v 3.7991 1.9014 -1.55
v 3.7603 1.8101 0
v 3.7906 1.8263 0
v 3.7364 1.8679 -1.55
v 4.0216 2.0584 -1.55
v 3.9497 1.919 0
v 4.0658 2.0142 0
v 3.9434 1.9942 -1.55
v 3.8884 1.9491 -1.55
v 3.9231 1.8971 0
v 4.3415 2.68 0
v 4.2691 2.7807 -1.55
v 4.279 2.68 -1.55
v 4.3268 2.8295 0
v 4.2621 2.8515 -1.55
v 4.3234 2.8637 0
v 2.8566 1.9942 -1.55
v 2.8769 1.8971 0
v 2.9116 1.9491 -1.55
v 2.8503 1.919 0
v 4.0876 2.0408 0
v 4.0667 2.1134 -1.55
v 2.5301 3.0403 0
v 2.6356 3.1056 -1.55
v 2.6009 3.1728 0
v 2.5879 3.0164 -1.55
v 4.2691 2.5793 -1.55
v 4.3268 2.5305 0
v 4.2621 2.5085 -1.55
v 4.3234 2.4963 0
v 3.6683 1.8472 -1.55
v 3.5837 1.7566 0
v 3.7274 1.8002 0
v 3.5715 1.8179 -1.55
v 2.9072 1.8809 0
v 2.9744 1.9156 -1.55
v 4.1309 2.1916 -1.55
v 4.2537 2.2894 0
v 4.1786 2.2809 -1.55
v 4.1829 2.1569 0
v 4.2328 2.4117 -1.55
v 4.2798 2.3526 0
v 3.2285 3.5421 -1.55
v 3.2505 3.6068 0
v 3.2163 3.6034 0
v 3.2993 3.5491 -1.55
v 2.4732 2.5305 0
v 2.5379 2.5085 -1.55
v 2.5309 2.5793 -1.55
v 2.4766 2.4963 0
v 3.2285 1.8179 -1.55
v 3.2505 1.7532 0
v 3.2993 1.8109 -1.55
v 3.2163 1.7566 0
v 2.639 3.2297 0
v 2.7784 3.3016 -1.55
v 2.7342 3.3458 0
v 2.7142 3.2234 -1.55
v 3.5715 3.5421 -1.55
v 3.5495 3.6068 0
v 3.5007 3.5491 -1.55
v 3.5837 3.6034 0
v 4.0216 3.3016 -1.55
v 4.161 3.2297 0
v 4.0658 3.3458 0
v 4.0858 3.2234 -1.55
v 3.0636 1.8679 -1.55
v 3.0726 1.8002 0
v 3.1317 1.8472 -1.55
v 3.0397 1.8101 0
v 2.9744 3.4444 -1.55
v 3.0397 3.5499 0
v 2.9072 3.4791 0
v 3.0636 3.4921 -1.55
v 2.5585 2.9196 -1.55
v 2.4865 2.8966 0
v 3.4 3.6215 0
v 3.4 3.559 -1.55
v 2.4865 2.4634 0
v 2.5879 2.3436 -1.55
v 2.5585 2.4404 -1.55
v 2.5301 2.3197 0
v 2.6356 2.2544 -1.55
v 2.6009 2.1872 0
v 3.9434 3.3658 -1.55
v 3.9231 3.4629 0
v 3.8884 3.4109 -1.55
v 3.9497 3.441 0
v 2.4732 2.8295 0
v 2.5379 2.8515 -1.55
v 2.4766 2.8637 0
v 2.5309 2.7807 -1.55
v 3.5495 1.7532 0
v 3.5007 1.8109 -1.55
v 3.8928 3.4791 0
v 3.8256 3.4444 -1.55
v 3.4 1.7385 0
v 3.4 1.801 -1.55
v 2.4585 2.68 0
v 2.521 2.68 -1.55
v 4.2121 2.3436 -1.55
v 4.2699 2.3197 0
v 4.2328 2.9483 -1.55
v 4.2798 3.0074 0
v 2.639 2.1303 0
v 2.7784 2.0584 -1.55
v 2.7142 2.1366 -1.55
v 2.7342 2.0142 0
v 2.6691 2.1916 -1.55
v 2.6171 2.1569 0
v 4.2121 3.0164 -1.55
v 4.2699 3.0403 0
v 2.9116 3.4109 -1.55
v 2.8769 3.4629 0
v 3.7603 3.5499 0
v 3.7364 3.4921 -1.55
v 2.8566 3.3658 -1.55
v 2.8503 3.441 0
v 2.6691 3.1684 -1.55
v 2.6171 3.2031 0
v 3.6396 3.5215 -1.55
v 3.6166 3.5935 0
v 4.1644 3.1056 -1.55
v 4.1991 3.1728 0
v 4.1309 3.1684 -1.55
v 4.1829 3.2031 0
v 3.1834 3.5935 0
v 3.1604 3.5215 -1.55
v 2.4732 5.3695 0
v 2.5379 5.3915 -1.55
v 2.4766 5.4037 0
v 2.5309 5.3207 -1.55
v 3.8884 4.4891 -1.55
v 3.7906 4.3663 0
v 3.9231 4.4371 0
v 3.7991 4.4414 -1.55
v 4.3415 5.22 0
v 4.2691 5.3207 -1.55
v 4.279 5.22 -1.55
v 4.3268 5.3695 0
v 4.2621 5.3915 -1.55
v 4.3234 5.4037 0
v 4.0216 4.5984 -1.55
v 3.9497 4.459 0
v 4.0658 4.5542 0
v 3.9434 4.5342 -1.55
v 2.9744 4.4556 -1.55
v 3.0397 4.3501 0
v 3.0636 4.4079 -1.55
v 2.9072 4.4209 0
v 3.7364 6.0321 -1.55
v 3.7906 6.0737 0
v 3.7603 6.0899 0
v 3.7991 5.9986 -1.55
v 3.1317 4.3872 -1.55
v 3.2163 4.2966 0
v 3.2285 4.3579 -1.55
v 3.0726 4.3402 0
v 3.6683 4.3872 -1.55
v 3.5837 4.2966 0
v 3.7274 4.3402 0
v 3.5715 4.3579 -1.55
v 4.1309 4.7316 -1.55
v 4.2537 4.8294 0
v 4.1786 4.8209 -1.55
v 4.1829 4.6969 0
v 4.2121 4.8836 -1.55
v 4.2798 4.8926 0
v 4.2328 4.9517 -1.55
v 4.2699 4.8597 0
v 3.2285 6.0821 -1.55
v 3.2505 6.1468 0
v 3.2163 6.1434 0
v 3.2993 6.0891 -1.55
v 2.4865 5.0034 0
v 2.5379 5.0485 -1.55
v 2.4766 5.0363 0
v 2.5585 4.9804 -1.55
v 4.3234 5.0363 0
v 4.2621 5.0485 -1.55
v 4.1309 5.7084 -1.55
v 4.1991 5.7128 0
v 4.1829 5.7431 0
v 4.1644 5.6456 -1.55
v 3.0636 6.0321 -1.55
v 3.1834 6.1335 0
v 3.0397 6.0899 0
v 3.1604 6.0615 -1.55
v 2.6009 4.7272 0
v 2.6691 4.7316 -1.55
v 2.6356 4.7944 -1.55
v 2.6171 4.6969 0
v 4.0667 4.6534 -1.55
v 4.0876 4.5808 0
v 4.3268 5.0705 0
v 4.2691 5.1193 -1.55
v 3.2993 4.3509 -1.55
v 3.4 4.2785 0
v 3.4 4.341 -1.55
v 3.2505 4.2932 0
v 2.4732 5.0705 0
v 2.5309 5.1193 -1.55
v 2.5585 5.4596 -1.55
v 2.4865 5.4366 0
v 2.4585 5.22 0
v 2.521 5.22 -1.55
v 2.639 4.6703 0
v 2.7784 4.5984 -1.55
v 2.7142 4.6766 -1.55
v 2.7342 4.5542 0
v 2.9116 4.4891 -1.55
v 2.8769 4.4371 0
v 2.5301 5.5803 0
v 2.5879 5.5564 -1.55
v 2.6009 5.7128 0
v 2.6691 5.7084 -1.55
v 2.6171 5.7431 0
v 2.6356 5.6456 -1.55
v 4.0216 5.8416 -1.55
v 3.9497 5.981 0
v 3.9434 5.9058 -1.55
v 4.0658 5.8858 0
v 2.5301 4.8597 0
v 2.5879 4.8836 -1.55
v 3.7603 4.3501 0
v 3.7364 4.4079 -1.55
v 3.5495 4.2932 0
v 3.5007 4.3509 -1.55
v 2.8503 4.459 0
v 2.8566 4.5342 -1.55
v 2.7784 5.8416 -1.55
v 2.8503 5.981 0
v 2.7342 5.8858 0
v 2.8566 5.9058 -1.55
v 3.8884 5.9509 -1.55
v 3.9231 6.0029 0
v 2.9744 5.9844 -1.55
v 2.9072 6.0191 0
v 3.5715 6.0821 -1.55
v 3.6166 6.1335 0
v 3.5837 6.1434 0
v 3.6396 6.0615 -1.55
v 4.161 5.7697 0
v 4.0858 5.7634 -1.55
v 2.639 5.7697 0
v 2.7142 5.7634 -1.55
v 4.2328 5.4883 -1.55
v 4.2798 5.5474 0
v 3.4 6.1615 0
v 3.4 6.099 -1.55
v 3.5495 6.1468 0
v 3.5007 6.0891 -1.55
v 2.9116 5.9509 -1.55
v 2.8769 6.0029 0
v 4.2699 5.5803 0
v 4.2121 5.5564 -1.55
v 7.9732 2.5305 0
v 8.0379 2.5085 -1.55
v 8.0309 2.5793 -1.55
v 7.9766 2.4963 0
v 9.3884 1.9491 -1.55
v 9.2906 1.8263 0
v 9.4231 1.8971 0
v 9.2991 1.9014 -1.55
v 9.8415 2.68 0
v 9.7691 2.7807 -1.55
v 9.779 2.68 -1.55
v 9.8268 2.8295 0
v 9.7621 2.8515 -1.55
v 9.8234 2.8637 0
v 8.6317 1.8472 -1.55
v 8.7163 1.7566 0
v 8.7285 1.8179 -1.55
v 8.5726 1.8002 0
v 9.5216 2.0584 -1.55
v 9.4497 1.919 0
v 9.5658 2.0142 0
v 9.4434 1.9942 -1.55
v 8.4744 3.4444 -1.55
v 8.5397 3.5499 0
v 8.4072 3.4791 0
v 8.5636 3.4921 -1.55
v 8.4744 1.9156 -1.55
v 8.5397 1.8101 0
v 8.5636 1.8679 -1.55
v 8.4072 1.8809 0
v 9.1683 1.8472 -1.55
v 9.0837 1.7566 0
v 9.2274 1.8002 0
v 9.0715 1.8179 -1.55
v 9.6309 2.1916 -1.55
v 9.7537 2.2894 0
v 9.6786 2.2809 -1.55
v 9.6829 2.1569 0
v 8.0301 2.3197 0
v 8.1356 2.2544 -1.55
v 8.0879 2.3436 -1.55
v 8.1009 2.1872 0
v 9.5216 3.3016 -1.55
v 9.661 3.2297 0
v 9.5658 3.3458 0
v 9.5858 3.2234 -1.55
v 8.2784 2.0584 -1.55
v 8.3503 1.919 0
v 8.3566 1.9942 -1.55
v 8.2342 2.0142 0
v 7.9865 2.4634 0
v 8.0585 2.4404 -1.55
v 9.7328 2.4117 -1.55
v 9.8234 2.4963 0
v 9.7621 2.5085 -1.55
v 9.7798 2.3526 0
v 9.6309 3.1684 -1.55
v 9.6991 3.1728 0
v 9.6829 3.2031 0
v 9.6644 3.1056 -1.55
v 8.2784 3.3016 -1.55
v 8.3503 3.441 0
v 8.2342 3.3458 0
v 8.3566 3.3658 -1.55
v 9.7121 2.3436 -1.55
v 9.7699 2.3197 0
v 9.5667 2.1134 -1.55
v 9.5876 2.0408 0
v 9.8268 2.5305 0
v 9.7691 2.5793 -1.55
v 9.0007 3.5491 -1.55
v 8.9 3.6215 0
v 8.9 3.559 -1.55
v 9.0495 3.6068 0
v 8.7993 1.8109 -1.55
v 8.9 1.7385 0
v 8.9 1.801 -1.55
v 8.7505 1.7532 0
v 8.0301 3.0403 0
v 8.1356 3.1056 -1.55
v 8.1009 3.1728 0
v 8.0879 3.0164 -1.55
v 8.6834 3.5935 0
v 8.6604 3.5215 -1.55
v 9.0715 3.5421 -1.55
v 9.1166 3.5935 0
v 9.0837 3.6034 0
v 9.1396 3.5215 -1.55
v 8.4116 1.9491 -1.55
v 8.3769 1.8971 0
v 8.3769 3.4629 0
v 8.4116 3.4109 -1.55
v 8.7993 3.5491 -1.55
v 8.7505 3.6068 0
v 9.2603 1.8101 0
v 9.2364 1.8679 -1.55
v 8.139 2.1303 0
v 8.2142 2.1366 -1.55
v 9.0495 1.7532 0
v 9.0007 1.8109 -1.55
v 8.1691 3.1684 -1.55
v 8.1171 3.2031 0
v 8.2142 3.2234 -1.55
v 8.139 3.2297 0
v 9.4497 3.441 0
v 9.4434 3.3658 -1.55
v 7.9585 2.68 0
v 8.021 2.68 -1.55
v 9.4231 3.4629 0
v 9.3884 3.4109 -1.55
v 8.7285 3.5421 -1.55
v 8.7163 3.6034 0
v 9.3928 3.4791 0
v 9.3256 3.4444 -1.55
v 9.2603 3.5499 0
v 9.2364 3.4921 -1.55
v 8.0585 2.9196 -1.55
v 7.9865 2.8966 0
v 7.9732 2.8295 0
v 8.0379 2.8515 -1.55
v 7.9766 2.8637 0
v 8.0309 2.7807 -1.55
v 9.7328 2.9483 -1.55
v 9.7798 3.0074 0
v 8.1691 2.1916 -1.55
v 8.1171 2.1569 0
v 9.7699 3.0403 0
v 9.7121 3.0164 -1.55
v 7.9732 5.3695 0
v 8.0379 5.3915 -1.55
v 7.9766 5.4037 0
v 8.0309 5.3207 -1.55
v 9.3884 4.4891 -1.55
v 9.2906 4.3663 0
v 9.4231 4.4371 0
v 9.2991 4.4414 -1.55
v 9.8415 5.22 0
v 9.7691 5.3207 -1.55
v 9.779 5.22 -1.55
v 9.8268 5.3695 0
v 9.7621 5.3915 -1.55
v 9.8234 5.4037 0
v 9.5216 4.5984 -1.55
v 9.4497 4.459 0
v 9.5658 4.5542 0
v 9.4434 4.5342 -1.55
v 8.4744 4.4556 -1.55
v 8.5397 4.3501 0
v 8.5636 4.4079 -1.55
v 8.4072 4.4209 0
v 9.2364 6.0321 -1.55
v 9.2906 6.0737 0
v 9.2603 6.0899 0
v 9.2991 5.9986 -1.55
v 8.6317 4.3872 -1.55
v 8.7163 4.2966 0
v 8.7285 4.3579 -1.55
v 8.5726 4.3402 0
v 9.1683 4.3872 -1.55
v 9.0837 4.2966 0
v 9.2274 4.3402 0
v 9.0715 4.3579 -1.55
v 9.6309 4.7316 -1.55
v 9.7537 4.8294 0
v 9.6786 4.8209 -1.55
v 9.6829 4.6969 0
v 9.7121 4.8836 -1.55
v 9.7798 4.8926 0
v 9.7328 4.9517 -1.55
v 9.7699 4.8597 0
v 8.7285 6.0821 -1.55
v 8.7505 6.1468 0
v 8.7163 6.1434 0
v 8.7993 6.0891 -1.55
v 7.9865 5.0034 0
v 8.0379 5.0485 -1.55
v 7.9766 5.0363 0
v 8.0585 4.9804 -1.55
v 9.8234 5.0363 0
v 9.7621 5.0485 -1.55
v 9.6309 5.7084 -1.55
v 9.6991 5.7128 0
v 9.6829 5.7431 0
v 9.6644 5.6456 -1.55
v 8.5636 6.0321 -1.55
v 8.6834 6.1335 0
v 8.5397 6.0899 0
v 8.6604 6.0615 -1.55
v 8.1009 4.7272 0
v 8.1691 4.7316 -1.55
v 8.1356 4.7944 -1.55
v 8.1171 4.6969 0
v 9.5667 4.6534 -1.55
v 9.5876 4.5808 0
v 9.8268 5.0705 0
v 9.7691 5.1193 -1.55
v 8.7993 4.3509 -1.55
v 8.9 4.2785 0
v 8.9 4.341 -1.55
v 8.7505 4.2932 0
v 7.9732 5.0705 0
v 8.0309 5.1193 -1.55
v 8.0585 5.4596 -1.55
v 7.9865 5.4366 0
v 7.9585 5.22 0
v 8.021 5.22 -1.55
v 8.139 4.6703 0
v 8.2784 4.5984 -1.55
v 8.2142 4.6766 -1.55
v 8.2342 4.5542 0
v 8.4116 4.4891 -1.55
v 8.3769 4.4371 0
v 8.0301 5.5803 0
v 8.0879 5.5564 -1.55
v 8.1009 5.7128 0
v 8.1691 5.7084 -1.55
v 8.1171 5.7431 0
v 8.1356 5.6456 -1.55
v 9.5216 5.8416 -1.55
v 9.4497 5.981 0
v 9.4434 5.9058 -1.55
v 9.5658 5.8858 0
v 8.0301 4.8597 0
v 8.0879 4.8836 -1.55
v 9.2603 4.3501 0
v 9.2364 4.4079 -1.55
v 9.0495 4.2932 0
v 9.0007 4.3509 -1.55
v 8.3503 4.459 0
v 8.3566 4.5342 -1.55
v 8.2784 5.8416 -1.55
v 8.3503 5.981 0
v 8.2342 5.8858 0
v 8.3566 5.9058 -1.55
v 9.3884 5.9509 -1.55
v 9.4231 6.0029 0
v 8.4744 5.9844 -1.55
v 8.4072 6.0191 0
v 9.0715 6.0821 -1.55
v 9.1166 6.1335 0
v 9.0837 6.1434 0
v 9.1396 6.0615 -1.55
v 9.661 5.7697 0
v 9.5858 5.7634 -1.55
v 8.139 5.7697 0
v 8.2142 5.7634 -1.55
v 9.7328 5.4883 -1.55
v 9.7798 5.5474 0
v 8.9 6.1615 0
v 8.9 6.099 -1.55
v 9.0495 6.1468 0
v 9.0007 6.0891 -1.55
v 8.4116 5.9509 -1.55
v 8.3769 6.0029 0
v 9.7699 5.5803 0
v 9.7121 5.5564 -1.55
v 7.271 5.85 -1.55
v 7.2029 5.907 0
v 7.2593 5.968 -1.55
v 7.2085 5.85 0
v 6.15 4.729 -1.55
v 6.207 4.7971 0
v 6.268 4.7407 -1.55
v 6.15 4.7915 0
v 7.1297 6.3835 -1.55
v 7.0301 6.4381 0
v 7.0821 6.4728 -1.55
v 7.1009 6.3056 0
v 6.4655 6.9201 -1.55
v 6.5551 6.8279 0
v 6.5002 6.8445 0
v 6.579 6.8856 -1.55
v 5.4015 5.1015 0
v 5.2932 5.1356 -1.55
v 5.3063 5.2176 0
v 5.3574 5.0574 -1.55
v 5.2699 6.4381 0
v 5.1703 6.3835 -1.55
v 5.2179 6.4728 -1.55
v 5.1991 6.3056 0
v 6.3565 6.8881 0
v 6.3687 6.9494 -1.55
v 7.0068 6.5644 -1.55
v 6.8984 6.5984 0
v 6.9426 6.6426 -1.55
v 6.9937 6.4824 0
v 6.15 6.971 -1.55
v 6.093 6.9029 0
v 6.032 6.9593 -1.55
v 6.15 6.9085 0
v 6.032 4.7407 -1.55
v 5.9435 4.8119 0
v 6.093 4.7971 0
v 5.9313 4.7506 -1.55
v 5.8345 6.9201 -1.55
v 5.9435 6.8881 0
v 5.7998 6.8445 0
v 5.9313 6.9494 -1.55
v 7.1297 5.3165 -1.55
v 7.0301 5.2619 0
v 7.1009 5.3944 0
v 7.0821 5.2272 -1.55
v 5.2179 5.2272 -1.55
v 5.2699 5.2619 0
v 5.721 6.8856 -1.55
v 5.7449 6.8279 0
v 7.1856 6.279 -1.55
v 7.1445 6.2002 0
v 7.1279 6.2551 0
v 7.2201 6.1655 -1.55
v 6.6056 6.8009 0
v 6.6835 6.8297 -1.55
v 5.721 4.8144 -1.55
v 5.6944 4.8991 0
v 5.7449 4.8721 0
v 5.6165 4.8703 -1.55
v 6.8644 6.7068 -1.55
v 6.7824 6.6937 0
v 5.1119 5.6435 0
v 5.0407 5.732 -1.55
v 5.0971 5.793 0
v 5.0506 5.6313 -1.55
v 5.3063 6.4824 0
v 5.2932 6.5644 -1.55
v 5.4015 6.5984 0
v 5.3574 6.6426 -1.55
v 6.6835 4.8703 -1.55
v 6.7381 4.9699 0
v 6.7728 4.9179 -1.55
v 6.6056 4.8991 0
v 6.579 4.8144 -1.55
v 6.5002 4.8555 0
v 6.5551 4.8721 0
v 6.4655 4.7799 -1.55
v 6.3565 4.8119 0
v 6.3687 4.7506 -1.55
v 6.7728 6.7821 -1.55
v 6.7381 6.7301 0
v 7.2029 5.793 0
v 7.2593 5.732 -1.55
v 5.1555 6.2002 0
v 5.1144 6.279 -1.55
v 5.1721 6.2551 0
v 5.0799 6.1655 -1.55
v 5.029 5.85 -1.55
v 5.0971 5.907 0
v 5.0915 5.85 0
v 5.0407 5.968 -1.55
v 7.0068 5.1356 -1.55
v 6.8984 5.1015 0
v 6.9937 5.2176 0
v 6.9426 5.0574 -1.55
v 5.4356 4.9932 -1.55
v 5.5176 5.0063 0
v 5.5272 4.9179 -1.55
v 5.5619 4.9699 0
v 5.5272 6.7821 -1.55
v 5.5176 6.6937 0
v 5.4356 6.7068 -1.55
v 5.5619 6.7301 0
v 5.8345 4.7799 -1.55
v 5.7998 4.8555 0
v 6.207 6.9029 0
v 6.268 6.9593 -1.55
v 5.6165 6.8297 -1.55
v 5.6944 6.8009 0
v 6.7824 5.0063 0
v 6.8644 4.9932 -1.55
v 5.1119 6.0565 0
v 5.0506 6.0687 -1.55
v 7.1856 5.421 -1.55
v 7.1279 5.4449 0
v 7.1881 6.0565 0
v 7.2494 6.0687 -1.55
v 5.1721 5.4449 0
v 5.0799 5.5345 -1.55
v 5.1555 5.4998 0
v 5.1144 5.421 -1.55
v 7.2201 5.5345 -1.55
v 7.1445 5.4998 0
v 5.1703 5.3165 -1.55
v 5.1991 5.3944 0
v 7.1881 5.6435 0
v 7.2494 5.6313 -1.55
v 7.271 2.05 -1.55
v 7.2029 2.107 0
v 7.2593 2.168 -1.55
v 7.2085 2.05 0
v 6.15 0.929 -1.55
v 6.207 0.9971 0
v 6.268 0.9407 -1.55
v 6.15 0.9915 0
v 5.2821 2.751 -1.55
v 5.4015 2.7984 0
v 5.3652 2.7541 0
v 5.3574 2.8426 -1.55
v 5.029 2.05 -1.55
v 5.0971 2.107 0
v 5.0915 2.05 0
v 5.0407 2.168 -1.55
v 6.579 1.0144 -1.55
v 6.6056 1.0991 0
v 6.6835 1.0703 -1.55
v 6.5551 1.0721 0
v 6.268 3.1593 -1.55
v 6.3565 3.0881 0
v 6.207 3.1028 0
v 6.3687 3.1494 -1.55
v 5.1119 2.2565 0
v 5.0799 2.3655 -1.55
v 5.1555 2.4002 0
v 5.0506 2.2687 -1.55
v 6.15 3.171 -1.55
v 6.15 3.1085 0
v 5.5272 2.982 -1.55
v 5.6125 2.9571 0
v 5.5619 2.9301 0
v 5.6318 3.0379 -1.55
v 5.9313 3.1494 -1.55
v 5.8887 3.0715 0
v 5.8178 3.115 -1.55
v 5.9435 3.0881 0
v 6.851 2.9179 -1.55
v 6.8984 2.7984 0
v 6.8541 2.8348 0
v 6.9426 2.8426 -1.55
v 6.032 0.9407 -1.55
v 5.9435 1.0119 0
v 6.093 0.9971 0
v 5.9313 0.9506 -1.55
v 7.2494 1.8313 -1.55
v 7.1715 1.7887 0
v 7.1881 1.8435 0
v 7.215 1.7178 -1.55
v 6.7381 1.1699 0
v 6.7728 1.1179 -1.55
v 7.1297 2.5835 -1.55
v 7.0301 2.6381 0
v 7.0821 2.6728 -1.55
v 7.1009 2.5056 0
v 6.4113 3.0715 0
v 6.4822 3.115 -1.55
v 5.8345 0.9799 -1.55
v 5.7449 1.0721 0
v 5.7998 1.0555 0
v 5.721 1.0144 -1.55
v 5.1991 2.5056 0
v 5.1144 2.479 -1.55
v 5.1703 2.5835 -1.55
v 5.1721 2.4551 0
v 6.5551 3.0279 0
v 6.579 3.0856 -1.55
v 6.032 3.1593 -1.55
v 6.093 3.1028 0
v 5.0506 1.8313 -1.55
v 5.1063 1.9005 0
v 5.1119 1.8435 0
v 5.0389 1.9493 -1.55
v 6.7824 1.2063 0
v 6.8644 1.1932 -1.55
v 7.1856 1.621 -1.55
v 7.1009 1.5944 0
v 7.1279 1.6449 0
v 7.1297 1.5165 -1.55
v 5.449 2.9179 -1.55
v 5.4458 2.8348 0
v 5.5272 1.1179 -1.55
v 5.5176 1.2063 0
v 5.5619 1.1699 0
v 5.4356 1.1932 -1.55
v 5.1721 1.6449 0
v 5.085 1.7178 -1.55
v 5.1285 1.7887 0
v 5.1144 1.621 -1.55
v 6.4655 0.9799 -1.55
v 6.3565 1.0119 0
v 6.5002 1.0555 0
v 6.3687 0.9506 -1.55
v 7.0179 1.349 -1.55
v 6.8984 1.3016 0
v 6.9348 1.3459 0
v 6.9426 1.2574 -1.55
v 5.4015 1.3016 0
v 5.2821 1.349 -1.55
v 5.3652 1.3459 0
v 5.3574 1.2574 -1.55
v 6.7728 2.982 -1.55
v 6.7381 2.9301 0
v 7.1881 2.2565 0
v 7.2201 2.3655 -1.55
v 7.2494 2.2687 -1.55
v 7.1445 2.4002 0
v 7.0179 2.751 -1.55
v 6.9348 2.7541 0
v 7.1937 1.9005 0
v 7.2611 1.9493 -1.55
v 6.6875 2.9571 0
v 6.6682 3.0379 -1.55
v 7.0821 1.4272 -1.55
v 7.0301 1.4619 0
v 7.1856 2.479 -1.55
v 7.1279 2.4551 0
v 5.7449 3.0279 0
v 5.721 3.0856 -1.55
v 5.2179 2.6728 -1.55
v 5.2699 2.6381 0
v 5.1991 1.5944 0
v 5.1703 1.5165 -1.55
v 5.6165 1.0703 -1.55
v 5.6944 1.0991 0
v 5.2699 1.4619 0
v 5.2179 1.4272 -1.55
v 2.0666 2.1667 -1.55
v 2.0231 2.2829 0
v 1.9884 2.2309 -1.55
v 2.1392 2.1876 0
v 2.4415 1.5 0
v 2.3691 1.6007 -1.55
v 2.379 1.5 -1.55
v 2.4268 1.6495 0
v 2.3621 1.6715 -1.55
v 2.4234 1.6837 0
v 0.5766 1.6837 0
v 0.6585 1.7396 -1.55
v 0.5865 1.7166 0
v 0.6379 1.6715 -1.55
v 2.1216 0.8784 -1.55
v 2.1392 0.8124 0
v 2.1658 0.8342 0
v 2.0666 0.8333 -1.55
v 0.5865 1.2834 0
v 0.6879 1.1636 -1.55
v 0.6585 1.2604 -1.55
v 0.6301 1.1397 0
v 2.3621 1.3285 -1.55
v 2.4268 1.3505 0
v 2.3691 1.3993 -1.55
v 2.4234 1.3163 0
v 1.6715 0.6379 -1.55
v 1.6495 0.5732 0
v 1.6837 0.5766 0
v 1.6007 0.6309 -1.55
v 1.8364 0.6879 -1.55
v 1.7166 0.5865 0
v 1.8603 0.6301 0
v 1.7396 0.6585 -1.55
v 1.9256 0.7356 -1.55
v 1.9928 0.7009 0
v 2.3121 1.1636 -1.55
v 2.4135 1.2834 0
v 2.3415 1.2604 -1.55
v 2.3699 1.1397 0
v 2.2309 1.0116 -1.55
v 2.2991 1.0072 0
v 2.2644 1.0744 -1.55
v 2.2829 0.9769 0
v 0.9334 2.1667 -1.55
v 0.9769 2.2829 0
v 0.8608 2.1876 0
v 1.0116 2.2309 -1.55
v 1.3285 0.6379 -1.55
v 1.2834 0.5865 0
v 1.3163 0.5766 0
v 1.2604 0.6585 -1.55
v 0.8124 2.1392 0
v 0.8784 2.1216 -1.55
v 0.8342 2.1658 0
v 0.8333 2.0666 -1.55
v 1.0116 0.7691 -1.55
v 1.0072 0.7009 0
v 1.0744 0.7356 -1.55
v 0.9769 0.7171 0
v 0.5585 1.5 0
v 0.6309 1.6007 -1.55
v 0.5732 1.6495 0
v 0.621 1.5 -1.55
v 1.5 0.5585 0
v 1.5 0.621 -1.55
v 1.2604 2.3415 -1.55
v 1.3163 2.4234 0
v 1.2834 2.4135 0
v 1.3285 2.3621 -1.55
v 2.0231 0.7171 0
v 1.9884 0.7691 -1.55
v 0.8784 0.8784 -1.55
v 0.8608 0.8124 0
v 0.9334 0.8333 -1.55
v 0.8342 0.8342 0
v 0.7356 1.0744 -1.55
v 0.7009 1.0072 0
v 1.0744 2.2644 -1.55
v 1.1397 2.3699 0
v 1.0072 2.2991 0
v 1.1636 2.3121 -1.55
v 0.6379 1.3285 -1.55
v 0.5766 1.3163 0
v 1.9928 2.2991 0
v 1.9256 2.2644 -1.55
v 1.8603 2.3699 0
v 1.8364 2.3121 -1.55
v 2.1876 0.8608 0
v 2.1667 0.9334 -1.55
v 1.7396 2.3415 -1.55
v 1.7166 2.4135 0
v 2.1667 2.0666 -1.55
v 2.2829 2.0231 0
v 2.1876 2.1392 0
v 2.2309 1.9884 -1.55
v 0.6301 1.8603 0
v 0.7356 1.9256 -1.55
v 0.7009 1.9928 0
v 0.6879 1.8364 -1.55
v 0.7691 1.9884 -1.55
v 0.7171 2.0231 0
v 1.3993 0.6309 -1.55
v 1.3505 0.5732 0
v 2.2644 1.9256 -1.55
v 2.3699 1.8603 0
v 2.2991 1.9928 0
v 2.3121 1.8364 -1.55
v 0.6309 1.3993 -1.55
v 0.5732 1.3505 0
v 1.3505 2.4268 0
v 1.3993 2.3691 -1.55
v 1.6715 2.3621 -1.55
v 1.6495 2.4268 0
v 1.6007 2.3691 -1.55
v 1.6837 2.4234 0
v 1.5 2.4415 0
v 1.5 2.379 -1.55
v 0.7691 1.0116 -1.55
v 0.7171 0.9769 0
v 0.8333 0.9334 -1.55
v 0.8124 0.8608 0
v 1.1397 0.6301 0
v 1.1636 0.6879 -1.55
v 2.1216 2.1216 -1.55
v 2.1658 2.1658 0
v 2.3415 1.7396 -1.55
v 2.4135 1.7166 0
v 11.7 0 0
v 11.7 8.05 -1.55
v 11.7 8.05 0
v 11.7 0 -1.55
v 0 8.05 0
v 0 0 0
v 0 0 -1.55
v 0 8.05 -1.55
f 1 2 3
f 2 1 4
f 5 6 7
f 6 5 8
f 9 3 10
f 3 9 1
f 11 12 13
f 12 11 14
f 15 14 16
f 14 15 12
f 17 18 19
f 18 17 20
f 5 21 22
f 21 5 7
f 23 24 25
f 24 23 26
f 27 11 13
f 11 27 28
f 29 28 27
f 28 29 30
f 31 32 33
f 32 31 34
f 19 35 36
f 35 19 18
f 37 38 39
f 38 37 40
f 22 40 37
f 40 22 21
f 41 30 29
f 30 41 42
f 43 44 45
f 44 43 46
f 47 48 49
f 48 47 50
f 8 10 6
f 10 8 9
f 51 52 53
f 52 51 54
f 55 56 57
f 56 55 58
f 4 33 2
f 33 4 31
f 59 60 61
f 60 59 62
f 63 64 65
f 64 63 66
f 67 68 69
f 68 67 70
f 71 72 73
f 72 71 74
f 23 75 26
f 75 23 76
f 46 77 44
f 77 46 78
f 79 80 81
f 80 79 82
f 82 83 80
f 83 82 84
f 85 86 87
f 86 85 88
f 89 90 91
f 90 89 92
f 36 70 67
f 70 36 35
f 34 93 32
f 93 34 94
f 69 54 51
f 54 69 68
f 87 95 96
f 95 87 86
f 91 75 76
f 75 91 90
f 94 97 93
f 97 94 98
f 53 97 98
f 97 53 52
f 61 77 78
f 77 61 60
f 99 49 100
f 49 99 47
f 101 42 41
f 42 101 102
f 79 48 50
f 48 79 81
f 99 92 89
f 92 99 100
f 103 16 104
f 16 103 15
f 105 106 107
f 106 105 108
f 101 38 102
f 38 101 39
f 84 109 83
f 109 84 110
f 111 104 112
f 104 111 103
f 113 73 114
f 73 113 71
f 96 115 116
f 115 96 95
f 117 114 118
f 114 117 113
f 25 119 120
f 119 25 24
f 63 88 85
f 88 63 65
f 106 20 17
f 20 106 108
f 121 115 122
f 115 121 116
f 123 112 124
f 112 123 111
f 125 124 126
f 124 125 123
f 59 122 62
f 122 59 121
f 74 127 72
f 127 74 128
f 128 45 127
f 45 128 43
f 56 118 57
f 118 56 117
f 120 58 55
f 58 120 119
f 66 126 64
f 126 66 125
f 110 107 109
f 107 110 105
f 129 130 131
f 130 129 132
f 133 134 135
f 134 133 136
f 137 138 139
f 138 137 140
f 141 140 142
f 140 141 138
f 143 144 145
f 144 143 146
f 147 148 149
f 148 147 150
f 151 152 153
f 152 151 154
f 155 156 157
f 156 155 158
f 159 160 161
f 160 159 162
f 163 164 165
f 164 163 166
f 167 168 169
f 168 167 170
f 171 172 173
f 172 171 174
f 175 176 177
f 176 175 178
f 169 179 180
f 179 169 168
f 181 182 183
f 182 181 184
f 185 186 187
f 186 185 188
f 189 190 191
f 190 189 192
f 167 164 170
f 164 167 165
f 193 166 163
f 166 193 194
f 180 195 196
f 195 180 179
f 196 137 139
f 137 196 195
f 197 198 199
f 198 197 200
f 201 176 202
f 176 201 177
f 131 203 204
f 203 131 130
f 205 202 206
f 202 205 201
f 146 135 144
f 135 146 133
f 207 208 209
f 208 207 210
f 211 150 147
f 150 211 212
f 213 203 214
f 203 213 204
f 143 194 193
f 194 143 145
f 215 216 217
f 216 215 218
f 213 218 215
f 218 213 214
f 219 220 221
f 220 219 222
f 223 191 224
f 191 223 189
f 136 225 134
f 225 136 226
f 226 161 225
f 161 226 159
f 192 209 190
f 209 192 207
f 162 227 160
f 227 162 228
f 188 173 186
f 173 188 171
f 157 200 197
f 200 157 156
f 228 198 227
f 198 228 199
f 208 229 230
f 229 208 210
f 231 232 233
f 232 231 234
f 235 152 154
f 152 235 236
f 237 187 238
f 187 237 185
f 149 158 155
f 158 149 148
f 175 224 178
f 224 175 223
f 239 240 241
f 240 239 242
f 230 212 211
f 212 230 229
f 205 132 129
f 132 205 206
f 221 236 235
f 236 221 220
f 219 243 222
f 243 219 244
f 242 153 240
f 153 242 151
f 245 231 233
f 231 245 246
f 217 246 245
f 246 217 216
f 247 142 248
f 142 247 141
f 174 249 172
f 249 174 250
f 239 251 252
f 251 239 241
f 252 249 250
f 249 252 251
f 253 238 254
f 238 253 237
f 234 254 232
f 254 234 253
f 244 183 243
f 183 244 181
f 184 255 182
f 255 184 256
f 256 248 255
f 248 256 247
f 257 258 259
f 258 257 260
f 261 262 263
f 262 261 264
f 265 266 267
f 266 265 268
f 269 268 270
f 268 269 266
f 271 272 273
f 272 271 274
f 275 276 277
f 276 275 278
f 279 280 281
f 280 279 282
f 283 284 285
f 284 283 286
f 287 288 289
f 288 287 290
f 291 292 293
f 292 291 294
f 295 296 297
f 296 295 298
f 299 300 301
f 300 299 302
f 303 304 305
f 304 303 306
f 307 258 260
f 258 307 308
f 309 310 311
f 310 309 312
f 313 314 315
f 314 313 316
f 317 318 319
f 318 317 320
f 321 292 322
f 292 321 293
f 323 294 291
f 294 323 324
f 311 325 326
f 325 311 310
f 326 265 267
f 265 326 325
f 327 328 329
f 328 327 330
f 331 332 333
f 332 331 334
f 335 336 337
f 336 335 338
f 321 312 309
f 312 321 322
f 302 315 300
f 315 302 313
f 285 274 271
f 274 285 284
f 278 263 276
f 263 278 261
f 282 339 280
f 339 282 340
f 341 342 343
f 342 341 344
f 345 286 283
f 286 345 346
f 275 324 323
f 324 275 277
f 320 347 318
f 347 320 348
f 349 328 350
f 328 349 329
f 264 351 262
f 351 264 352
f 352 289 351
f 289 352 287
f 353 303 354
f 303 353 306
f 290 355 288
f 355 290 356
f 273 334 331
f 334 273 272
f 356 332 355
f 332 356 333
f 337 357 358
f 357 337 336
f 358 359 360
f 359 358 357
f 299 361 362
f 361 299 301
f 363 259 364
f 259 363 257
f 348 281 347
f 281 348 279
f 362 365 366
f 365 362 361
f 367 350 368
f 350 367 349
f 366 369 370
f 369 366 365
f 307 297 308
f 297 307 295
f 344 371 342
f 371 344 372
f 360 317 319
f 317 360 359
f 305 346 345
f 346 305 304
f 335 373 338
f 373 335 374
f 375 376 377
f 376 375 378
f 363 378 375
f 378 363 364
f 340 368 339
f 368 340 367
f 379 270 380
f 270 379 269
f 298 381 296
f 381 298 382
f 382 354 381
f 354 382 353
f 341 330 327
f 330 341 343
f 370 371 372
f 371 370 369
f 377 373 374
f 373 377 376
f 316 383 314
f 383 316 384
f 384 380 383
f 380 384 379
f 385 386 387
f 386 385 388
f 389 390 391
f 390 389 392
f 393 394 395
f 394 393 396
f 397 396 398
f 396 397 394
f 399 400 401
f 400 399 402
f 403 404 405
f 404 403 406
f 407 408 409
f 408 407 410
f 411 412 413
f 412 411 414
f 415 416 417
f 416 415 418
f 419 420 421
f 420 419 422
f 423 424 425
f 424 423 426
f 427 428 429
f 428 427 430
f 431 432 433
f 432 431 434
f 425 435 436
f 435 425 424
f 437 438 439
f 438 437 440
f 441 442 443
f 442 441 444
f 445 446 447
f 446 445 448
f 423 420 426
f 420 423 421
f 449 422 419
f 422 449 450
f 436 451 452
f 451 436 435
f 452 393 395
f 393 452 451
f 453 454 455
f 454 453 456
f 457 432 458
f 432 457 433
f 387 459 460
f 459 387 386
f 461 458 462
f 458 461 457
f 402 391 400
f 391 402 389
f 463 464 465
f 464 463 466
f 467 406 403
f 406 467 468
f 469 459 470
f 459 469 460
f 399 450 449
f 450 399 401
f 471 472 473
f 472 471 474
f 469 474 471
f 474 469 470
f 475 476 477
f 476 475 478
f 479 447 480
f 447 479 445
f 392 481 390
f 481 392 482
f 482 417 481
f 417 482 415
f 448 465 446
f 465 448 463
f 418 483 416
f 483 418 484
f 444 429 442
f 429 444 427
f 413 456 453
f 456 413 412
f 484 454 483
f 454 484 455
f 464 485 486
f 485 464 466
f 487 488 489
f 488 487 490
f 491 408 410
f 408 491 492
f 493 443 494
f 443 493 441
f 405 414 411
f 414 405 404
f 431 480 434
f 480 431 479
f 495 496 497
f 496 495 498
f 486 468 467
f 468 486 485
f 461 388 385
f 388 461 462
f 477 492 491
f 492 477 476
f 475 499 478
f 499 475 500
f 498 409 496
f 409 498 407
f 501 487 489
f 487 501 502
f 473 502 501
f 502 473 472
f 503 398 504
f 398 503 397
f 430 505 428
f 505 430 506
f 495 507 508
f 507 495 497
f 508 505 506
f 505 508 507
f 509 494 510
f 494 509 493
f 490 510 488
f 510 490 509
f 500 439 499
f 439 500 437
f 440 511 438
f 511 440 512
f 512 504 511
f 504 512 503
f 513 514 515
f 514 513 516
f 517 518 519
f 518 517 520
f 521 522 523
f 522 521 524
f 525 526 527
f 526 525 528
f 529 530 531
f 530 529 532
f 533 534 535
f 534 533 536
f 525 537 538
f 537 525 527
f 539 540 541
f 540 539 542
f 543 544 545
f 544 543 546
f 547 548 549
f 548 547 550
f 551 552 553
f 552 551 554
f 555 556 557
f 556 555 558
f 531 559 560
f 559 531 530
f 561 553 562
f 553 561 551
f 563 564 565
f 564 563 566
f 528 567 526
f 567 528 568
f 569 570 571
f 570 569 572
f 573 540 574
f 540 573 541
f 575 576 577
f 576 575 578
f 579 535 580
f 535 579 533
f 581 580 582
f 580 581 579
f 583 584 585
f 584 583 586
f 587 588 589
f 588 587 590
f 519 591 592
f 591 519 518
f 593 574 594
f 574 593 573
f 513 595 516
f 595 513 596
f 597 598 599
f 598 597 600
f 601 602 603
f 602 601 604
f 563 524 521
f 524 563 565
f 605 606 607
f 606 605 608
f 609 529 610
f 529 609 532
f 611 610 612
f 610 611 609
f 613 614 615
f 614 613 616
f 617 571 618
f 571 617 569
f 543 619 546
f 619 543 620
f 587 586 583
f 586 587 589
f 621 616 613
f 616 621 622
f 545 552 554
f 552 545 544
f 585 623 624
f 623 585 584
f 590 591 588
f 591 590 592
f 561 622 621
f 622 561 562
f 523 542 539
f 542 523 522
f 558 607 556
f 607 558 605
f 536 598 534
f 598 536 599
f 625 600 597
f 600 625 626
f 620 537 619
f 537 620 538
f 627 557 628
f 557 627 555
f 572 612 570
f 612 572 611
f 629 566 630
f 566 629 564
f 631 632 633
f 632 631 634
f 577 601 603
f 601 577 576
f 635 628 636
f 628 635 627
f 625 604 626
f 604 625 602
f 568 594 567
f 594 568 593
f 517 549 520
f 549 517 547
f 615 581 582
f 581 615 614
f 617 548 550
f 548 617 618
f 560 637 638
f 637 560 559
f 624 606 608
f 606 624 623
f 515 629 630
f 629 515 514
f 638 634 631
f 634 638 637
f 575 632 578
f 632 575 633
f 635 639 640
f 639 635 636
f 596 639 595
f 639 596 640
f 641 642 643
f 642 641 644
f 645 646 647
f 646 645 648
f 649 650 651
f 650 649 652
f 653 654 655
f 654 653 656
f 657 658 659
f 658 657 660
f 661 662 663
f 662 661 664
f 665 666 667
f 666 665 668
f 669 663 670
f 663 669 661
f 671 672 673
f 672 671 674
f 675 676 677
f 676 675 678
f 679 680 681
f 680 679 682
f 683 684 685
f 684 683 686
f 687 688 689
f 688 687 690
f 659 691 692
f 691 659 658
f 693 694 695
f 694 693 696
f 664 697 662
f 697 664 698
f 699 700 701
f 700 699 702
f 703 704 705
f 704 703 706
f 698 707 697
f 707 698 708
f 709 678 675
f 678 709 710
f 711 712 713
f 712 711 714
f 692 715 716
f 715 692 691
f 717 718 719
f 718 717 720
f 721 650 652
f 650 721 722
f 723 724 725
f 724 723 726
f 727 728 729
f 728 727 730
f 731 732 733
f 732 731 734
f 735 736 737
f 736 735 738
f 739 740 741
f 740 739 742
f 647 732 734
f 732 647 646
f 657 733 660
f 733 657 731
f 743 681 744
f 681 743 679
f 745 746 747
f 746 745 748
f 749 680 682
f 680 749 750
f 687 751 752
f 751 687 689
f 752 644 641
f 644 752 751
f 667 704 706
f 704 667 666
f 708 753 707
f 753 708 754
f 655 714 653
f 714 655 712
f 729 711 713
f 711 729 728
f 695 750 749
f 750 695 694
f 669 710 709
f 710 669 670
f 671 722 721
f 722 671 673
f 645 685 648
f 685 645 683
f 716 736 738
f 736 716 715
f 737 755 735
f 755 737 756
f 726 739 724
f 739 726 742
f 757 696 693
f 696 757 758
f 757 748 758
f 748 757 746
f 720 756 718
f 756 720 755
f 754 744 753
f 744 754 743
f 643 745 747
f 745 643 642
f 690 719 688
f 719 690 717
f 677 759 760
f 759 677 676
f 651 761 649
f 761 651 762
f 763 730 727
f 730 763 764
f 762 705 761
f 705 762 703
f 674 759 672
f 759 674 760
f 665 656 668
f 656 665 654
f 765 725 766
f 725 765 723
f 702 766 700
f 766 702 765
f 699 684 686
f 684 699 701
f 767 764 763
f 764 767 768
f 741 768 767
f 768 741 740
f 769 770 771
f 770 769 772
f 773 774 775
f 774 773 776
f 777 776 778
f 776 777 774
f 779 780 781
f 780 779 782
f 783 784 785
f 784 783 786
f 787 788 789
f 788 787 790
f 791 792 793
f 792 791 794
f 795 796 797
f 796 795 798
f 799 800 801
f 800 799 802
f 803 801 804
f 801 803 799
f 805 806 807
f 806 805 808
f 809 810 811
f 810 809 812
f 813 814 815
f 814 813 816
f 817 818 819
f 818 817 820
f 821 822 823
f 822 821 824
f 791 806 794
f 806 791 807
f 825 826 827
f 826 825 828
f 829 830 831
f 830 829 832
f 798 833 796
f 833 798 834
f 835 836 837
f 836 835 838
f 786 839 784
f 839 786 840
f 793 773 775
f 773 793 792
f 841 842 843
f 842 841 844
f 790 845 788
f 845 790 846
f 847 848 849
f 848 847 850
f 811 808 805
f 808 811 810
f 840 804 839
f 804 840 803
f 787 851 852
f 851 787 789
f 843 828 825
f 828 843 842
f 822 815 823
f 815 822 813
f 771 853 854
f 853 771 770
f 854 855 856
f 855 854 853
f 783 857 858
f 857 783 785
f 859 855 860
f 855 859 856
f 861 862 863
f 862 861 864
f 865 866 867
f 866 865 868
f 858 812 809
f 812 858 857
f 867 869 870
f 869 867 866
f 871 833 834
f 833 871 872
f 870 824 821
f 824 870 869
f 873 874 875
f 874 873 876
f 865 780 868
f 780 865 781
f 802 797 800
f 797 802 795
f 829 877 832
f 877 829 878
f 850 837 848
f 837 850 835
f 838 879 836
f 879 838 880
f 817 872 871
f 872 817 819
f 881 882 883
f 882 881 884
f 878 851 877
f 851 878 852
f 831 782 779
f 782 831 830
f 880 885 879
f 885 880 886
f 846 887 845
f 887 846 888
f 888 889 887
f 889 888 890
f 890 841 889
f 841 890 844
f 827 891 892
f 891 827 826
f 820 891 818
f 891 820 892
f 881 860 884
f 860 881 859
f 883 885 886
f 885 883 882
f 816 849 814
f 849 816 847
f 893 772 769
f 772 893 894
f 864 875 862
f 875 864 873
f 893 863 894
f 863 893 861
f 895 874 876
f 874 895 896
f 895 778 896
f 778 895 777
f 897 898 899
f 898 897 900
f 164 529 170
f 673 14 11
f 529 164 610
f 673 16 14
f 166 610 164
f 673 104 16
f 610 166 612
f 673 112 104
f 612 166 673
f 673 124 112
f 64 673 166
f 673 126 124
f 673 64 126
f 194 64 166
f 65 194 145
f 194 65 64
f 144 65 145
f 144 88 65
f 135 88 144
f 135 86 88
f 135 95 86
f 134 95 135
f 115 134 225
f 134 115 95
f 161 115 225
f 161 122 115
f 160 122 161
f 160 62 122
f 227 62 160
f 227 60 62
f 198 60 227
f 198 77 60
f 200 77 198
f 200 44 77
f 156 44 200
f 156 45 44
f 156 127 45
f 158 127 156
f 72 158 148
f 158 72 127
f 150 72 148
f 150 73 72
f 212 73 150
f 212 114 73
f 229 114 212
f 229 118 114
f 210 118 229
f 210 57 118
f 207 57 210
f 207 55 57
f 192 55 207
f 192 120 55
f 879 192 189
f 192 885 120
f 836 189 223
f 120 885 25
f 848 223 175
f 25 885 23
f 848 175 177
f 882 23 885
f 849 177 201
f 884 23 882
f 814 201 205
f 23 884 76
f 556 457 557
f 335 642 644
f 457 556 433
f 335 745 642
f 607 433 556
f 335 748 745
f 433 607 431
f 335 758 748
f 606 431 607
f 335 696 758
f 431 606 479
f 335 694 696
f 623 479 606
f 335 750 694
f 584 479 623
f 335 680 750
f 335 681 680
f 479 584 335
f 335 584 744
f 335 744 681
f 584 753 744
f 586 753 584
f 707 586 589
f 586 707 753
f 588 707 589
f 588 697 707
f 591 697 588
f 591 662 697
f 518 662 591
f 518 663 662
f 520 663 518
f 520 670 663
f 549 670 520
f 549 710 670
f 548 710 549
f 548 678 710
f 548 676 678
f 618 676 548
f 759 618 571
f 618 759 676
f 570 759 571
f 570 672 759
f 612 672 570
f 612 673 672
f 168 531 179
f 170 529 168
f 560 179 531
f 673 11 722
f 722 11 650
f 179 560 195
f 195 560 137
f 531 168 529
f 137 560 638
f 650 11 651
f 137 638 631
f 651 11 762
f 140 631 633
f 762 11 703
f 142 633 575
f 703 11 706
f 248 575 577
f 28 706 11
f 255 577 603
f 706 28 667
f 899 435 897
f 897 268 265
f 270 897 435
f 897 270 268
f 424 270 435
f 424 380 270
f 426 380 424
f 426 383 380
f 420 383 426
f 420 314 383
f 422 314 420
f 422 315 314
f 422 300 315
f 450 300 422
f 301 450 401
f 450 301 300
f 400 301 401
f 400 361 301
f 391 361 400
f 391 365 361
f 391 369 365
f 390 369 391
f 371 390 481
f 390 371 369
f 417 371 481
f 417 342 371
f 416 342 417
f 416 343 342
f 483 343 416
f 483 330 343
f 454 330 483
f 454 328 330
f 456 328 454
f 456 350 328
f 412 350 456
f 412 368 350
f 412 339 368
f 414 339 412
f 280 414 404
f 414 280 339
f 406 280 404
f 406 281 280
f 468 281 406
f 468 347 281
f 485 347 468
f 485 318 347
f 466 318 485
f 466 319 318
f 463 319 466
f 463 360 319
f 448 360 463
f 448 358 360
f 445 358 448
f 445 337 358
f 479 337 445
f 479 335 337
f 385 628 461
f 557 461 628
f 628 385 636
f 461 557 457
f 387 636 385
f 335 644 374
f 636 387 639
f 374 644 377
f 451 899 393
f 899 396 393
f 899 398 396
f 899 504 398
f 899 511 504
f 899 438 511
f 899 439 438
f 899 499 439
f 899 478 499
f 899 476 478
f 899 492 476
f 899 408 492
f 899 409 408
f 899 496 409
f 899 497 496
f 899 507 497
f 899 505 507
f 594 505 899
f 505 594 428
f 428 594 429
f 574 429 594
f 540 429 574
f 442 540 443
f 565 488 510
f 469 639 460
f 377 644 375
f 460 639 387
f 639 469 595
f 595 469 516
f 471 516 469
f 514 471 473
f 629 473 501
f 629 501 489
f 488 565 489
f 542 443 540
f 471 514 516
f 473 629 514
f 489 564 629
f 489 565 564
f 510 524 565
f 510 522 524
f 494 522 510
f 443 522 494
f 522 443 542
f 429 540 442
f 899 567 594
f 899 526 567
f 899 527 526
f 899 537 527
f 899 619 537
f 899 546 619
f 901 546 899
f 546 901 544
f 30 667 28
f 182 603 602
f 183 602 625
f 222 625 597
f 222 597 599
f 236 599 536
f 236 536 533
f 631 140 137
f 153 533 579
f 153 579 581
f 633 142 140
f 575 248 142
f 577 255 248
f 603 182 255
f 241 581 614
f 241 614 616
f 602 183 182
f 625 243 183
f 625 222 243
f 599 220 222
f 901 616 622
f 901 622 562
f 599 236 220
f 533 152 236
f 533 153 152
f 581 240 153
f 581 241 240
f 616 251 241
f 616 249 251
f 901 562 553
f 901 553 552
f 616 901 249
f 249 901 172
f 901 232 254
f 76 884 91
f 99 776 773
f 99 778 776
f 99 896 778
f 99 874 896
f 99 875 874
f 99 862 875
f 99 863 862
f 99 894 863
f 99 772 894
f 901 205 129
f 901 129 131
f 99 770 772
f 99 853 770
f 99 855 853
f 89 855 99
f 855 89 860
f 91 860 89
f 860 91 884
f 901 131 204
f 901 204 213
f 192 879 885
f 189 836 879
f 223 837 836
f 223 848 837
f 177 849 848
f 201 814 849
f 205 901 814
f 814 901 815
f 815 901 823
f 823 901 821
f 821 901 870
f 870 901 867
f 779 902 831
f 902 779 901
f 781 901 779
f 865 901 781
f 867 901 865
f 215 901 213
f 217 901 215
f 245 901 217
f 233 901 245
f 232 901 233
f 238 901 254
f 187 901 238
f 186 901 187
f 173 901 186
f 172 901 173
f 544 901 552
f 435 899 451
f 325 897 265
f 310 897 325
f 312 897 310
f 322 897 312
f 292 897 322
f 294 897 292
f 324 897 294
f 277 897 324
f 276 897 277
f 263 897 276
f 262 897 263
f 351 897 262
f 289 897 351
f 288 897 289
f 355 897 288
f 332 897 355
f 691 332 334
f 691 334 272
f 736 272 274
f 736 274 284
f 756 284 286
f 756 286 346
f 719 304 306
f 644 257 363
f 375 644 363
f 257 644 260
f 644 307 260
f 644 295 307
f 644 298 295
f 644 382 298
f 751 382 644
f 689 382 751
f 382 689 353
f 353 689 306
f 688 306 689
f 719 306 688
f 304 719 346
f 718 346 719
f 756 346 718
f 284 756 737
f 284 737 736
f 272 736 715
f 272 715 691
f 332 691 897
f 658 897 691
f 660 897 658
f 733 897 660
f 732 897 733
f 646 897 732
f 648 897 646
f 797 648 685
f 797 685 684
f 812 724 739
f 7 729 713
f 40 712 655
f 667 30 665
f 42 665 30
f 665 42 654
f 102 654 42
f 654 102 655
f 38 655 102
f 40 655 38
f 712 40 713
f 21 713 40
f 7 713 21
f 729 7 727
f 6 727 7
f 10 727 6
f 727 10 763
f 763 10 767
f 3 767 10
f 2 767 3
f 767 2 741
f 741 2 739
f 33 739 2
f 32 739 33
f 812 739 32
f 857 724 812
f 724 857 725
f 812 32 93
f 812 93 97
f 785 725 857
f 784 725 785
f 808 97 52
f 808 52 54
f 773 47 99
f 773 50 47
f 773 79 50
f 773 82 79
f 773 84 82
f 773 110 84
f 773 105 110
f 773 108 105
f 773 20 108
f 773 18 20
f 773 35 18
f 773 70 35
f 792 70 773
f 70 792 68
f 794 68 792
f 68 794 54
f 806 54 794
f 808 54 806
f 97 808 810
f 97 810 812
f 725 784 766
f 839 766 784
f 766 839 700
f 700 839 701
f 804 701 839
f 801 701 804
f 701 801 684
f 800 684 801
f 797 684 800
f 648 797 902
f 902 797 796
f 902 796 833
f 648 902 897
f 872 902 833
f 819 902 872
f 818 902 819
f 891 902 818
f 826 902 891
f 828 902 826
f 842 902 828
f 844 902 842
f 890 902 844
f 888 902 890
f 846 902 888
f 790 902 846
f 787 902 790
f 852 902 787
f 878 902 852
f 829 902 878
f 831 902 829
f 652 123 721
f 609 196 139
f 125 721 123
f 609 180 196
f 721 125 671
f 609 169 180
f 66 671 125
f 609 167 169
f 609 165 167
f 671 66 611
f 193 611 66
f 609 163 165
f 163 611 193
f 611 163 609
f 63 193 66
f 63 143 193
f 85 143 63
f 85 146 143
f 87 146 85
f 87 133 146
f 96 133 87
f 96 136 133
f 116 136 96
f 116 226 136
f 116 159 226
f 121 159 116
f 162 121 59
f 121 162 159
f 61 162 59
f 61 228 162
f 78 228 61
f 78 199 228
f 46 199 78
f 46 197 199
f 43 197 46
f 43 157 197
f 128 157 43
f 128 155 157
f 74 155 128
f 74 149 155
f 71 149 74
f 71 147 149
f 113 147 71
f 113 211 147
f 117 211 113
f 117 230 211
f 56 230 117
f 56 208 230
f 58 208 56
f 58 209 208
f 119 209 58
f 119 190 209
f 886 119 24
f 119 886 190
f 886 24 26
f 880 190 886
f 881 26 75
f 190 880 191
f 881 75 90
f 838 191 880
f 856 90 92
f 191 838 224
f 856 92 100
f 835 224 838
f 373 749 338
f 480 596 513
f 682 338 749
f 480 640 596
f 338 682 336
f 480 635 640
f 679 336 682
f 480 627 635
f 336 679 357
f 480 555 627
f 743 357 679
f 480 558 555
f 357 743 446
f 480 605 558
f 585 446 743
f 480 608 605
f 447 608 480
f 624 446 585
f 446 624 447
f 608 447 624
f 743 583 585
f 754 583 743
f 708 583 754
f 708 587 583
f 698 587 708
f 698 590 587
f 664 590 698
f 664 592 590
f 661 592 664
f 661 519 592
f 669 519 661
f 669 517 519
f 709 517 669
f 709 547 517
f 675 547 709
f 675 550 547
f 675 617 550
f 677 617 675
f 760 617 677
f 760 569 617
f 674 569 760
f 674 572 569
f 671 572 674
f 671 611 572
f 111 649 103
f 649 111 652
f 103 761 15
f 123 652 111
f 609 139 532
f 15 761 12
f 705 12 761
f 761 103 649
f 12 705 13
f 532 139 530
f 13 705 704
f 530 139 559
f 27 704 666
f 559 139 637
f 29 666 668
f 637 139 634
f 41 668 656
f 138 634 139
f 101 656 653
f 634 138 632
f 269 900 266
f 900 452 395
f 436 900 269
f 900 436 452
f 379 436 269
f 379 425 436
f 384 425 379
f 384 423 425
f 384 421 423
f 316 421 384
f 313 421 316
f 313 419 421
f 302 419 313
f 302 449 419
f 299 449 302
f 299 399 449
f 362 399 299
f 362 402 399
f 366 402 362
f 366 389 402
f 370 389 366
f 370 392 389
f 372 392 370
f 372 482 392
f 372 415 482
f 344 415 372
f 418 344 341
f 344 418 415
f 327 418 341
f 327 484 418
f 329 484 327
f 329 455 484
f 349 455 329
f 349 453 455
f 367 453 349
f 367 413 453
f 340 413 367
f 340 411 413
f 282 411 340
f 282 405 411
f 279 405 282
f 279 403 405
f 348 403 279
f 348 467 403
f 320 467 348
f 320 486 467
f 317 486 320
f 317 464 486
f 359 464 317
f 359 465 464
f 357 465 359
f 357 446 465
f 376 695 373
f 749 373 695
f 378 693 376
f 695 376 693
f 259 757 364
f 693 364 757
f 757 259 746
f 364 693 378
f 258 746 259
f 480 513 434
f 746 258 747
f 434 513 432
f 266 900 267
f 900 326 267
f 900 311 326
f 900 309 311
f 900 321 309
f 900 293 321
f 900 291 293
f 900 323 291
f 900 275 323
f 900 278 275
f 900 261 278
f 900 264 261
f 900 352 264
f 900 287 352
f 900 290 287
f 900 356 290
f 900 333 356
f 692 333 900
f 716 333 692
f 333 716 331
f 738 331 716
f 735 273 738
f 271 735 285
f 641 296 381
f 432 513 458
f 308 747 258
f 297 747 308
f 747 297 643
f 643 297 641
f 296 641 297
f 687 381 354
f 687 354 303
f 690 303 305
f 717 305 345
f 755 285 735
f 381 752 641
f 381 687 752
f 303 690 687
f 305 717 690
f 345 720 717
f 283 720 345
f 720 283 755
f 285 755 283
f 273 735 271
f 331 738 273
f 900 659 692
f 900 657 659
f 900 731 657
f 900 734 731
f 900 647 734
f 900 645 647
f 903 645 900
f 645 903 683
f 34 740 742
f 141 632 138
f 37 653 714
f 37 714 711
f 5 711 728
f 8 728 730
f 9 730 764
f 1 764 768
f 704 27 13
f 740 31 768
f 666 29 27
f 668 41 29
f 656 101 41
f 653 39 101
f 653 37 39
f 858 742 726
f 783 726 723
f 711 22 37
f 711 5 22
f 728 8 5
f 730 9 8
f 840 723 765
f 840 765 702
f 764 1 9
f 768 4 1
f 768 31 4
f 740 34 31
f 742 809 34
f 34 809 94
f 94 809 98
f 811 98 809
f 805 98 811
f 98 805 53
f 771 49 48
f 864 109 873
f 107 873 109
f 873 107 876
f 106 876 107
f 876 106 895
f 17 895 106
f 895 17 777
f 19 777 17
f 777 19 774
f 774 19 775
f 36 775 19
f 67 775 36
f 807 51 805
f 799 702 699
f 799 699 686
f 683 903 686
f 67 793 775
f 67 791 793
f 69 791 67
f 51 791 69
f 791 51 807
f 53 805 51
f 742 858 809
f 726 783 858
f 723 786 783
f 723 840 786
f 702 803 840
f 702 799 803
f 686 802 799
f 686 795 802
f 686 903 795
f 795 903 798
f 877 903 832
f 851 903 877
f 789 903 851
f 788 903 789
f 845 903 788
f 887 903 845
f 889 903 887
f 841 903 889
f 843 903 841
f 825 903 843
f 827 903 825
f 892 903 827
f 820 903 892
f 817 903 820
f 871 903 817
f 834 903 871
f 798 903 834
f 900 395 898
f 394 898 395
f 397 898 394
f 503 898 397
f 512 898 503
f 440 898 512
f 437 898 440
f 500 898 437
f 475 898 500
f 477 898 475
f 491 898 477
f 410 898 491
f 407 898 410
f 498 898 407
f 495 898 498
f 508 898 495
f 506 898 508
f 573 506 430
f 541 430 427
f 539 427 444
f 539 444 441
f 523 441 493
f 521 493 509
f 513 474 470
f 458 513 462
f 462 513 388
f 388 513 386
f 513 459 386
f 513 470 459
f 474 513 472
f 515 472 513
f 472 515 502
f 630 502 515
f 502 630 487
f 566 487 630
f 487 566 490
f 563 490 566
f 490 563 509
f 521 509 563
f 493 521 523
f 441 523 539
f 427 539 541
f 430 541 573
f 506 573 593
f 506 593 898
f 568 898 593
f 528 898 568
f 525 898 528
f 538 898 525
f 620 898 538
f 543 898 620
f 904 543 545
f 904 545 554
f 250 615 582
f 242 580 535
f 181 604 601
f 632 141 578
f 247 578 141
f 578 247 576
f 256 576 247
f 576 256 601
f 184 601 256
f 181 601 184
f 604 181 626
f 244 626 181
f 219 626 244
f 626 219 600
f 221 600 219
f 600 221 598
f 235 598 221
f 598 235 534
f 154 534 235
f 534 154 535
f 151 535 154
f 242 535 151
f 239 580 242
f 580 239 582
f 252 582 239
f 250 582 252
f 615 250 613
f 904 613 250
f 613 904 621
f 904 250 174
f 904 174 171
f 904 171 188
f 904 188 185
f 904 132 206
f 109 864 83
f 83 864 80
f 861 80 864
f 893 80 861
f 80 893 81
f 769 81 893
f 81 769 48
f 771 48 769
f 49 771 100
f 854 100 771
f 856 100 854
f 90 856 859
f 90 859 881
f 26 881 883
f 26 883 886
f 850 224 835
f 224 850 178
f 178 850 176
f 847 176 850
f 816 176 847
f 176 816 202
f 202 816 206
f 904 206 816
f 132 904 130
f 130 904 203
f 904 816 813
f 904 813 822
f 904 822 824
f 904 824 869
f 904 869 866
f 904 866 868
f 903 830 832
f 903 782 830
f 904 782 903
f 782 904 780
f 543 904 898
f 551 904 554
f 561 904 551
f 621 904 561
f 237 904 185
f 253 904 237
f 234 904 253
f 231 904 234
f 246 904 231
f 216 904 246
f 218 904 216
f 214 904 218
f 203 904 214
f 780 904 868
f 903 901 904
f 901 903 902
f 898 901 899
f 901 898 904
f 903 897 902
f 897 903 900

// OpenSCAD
/*
	TCRT5000_Mount

	Author: radiogeek381@gmail.com

	A slab with holes arranged to fit the
	TCRT5000 optical sensor from Vishay.
	http://www.vishay.com/docs/83760/tcrt5000.pdf
*/

// dimensions in mm -- use TCRT5000_Mount_in() for designs
// that scale to mm at the last stage.
//
// Or use TCRT5000_Mount_mm() to get a scaled to mm version.

TCRT5000_Z = 1.55;
TCRT5000_Y = 5.8;


BaseX = 10.2;
BaseY = TCRT5000_Y;
BaseZ = TCRT5000_Z;

CenterX = 4.65;
CenterY = 2.45;

MountHolePos = [ [ CenterX, CenterY + 1.9, 0], [ CenterX, CenterY - 1.9, 0 ] ];
    

LeadHoleLX = CenterX - 2.75;
LeadHoleRX = CenterX + 2.75; 
LeadHoleLY = CenterY - 1.27;
LeadHoleUY = CenterY + 1.27; 
LeadHolePos = [ [LeadHoleLX, LeadHoleLY, 0], [LeadHoleLX, LeadHoleUY, 0], [LeadHoleRX, LeadHoleLY, 0], [LeadHoleRX, LeadHoleUY, 0] ];
SlabOffsetX = 1.5;
SlabOffsetY = 1.5; 

HoleDepth = BaseZ * 4; 


function TCRT5000_Z_mm() = TCRT5000_Z; 
function TCRT5000_Z_in() = TCRT5000_Z / 25.4;
function TCRT5000_Y_mm() = TCRT5000_Y;
function TCRT5000_Y_in() = (TCRT5000_Y + 1.5*SlabOffsetY) / 25.4;

$fn=32;
module TCRT5000_Mount_mm() {

    translate([SlabOffsetX, SlabOffsetY, -BaseZ]) difference() {
        translate([-SlabOffsetX, -SlabOffsetY, 0])
            cube([BaseX + SlabOffsetX, BaseY + 1.5*SlabOffsetY, BaseZ]);
	// datum hole
        translate([0, 0, -0.1]) {
   	    cylinder(d1 = 1.5, h = HoleDepth, center=true);
	    for(p = LeadHolePos) {
	        translate(p) cylinder(d1 = 1.5, h = HoleDepth, center=true);
	    }
	    for(p = MountHolePos) {
	        translate(p) cylinder(d1 = 2.5, h = HoleDepth, center=true);
	    }
	}
    }
}


module TCRT5000_Mount_in() {
    sf = 1.0 / 25.4;
    scale([sf, sf, sf]) TCRT5000_Mount_mm();
}

// test

TCRT5000_Mount_mm();
